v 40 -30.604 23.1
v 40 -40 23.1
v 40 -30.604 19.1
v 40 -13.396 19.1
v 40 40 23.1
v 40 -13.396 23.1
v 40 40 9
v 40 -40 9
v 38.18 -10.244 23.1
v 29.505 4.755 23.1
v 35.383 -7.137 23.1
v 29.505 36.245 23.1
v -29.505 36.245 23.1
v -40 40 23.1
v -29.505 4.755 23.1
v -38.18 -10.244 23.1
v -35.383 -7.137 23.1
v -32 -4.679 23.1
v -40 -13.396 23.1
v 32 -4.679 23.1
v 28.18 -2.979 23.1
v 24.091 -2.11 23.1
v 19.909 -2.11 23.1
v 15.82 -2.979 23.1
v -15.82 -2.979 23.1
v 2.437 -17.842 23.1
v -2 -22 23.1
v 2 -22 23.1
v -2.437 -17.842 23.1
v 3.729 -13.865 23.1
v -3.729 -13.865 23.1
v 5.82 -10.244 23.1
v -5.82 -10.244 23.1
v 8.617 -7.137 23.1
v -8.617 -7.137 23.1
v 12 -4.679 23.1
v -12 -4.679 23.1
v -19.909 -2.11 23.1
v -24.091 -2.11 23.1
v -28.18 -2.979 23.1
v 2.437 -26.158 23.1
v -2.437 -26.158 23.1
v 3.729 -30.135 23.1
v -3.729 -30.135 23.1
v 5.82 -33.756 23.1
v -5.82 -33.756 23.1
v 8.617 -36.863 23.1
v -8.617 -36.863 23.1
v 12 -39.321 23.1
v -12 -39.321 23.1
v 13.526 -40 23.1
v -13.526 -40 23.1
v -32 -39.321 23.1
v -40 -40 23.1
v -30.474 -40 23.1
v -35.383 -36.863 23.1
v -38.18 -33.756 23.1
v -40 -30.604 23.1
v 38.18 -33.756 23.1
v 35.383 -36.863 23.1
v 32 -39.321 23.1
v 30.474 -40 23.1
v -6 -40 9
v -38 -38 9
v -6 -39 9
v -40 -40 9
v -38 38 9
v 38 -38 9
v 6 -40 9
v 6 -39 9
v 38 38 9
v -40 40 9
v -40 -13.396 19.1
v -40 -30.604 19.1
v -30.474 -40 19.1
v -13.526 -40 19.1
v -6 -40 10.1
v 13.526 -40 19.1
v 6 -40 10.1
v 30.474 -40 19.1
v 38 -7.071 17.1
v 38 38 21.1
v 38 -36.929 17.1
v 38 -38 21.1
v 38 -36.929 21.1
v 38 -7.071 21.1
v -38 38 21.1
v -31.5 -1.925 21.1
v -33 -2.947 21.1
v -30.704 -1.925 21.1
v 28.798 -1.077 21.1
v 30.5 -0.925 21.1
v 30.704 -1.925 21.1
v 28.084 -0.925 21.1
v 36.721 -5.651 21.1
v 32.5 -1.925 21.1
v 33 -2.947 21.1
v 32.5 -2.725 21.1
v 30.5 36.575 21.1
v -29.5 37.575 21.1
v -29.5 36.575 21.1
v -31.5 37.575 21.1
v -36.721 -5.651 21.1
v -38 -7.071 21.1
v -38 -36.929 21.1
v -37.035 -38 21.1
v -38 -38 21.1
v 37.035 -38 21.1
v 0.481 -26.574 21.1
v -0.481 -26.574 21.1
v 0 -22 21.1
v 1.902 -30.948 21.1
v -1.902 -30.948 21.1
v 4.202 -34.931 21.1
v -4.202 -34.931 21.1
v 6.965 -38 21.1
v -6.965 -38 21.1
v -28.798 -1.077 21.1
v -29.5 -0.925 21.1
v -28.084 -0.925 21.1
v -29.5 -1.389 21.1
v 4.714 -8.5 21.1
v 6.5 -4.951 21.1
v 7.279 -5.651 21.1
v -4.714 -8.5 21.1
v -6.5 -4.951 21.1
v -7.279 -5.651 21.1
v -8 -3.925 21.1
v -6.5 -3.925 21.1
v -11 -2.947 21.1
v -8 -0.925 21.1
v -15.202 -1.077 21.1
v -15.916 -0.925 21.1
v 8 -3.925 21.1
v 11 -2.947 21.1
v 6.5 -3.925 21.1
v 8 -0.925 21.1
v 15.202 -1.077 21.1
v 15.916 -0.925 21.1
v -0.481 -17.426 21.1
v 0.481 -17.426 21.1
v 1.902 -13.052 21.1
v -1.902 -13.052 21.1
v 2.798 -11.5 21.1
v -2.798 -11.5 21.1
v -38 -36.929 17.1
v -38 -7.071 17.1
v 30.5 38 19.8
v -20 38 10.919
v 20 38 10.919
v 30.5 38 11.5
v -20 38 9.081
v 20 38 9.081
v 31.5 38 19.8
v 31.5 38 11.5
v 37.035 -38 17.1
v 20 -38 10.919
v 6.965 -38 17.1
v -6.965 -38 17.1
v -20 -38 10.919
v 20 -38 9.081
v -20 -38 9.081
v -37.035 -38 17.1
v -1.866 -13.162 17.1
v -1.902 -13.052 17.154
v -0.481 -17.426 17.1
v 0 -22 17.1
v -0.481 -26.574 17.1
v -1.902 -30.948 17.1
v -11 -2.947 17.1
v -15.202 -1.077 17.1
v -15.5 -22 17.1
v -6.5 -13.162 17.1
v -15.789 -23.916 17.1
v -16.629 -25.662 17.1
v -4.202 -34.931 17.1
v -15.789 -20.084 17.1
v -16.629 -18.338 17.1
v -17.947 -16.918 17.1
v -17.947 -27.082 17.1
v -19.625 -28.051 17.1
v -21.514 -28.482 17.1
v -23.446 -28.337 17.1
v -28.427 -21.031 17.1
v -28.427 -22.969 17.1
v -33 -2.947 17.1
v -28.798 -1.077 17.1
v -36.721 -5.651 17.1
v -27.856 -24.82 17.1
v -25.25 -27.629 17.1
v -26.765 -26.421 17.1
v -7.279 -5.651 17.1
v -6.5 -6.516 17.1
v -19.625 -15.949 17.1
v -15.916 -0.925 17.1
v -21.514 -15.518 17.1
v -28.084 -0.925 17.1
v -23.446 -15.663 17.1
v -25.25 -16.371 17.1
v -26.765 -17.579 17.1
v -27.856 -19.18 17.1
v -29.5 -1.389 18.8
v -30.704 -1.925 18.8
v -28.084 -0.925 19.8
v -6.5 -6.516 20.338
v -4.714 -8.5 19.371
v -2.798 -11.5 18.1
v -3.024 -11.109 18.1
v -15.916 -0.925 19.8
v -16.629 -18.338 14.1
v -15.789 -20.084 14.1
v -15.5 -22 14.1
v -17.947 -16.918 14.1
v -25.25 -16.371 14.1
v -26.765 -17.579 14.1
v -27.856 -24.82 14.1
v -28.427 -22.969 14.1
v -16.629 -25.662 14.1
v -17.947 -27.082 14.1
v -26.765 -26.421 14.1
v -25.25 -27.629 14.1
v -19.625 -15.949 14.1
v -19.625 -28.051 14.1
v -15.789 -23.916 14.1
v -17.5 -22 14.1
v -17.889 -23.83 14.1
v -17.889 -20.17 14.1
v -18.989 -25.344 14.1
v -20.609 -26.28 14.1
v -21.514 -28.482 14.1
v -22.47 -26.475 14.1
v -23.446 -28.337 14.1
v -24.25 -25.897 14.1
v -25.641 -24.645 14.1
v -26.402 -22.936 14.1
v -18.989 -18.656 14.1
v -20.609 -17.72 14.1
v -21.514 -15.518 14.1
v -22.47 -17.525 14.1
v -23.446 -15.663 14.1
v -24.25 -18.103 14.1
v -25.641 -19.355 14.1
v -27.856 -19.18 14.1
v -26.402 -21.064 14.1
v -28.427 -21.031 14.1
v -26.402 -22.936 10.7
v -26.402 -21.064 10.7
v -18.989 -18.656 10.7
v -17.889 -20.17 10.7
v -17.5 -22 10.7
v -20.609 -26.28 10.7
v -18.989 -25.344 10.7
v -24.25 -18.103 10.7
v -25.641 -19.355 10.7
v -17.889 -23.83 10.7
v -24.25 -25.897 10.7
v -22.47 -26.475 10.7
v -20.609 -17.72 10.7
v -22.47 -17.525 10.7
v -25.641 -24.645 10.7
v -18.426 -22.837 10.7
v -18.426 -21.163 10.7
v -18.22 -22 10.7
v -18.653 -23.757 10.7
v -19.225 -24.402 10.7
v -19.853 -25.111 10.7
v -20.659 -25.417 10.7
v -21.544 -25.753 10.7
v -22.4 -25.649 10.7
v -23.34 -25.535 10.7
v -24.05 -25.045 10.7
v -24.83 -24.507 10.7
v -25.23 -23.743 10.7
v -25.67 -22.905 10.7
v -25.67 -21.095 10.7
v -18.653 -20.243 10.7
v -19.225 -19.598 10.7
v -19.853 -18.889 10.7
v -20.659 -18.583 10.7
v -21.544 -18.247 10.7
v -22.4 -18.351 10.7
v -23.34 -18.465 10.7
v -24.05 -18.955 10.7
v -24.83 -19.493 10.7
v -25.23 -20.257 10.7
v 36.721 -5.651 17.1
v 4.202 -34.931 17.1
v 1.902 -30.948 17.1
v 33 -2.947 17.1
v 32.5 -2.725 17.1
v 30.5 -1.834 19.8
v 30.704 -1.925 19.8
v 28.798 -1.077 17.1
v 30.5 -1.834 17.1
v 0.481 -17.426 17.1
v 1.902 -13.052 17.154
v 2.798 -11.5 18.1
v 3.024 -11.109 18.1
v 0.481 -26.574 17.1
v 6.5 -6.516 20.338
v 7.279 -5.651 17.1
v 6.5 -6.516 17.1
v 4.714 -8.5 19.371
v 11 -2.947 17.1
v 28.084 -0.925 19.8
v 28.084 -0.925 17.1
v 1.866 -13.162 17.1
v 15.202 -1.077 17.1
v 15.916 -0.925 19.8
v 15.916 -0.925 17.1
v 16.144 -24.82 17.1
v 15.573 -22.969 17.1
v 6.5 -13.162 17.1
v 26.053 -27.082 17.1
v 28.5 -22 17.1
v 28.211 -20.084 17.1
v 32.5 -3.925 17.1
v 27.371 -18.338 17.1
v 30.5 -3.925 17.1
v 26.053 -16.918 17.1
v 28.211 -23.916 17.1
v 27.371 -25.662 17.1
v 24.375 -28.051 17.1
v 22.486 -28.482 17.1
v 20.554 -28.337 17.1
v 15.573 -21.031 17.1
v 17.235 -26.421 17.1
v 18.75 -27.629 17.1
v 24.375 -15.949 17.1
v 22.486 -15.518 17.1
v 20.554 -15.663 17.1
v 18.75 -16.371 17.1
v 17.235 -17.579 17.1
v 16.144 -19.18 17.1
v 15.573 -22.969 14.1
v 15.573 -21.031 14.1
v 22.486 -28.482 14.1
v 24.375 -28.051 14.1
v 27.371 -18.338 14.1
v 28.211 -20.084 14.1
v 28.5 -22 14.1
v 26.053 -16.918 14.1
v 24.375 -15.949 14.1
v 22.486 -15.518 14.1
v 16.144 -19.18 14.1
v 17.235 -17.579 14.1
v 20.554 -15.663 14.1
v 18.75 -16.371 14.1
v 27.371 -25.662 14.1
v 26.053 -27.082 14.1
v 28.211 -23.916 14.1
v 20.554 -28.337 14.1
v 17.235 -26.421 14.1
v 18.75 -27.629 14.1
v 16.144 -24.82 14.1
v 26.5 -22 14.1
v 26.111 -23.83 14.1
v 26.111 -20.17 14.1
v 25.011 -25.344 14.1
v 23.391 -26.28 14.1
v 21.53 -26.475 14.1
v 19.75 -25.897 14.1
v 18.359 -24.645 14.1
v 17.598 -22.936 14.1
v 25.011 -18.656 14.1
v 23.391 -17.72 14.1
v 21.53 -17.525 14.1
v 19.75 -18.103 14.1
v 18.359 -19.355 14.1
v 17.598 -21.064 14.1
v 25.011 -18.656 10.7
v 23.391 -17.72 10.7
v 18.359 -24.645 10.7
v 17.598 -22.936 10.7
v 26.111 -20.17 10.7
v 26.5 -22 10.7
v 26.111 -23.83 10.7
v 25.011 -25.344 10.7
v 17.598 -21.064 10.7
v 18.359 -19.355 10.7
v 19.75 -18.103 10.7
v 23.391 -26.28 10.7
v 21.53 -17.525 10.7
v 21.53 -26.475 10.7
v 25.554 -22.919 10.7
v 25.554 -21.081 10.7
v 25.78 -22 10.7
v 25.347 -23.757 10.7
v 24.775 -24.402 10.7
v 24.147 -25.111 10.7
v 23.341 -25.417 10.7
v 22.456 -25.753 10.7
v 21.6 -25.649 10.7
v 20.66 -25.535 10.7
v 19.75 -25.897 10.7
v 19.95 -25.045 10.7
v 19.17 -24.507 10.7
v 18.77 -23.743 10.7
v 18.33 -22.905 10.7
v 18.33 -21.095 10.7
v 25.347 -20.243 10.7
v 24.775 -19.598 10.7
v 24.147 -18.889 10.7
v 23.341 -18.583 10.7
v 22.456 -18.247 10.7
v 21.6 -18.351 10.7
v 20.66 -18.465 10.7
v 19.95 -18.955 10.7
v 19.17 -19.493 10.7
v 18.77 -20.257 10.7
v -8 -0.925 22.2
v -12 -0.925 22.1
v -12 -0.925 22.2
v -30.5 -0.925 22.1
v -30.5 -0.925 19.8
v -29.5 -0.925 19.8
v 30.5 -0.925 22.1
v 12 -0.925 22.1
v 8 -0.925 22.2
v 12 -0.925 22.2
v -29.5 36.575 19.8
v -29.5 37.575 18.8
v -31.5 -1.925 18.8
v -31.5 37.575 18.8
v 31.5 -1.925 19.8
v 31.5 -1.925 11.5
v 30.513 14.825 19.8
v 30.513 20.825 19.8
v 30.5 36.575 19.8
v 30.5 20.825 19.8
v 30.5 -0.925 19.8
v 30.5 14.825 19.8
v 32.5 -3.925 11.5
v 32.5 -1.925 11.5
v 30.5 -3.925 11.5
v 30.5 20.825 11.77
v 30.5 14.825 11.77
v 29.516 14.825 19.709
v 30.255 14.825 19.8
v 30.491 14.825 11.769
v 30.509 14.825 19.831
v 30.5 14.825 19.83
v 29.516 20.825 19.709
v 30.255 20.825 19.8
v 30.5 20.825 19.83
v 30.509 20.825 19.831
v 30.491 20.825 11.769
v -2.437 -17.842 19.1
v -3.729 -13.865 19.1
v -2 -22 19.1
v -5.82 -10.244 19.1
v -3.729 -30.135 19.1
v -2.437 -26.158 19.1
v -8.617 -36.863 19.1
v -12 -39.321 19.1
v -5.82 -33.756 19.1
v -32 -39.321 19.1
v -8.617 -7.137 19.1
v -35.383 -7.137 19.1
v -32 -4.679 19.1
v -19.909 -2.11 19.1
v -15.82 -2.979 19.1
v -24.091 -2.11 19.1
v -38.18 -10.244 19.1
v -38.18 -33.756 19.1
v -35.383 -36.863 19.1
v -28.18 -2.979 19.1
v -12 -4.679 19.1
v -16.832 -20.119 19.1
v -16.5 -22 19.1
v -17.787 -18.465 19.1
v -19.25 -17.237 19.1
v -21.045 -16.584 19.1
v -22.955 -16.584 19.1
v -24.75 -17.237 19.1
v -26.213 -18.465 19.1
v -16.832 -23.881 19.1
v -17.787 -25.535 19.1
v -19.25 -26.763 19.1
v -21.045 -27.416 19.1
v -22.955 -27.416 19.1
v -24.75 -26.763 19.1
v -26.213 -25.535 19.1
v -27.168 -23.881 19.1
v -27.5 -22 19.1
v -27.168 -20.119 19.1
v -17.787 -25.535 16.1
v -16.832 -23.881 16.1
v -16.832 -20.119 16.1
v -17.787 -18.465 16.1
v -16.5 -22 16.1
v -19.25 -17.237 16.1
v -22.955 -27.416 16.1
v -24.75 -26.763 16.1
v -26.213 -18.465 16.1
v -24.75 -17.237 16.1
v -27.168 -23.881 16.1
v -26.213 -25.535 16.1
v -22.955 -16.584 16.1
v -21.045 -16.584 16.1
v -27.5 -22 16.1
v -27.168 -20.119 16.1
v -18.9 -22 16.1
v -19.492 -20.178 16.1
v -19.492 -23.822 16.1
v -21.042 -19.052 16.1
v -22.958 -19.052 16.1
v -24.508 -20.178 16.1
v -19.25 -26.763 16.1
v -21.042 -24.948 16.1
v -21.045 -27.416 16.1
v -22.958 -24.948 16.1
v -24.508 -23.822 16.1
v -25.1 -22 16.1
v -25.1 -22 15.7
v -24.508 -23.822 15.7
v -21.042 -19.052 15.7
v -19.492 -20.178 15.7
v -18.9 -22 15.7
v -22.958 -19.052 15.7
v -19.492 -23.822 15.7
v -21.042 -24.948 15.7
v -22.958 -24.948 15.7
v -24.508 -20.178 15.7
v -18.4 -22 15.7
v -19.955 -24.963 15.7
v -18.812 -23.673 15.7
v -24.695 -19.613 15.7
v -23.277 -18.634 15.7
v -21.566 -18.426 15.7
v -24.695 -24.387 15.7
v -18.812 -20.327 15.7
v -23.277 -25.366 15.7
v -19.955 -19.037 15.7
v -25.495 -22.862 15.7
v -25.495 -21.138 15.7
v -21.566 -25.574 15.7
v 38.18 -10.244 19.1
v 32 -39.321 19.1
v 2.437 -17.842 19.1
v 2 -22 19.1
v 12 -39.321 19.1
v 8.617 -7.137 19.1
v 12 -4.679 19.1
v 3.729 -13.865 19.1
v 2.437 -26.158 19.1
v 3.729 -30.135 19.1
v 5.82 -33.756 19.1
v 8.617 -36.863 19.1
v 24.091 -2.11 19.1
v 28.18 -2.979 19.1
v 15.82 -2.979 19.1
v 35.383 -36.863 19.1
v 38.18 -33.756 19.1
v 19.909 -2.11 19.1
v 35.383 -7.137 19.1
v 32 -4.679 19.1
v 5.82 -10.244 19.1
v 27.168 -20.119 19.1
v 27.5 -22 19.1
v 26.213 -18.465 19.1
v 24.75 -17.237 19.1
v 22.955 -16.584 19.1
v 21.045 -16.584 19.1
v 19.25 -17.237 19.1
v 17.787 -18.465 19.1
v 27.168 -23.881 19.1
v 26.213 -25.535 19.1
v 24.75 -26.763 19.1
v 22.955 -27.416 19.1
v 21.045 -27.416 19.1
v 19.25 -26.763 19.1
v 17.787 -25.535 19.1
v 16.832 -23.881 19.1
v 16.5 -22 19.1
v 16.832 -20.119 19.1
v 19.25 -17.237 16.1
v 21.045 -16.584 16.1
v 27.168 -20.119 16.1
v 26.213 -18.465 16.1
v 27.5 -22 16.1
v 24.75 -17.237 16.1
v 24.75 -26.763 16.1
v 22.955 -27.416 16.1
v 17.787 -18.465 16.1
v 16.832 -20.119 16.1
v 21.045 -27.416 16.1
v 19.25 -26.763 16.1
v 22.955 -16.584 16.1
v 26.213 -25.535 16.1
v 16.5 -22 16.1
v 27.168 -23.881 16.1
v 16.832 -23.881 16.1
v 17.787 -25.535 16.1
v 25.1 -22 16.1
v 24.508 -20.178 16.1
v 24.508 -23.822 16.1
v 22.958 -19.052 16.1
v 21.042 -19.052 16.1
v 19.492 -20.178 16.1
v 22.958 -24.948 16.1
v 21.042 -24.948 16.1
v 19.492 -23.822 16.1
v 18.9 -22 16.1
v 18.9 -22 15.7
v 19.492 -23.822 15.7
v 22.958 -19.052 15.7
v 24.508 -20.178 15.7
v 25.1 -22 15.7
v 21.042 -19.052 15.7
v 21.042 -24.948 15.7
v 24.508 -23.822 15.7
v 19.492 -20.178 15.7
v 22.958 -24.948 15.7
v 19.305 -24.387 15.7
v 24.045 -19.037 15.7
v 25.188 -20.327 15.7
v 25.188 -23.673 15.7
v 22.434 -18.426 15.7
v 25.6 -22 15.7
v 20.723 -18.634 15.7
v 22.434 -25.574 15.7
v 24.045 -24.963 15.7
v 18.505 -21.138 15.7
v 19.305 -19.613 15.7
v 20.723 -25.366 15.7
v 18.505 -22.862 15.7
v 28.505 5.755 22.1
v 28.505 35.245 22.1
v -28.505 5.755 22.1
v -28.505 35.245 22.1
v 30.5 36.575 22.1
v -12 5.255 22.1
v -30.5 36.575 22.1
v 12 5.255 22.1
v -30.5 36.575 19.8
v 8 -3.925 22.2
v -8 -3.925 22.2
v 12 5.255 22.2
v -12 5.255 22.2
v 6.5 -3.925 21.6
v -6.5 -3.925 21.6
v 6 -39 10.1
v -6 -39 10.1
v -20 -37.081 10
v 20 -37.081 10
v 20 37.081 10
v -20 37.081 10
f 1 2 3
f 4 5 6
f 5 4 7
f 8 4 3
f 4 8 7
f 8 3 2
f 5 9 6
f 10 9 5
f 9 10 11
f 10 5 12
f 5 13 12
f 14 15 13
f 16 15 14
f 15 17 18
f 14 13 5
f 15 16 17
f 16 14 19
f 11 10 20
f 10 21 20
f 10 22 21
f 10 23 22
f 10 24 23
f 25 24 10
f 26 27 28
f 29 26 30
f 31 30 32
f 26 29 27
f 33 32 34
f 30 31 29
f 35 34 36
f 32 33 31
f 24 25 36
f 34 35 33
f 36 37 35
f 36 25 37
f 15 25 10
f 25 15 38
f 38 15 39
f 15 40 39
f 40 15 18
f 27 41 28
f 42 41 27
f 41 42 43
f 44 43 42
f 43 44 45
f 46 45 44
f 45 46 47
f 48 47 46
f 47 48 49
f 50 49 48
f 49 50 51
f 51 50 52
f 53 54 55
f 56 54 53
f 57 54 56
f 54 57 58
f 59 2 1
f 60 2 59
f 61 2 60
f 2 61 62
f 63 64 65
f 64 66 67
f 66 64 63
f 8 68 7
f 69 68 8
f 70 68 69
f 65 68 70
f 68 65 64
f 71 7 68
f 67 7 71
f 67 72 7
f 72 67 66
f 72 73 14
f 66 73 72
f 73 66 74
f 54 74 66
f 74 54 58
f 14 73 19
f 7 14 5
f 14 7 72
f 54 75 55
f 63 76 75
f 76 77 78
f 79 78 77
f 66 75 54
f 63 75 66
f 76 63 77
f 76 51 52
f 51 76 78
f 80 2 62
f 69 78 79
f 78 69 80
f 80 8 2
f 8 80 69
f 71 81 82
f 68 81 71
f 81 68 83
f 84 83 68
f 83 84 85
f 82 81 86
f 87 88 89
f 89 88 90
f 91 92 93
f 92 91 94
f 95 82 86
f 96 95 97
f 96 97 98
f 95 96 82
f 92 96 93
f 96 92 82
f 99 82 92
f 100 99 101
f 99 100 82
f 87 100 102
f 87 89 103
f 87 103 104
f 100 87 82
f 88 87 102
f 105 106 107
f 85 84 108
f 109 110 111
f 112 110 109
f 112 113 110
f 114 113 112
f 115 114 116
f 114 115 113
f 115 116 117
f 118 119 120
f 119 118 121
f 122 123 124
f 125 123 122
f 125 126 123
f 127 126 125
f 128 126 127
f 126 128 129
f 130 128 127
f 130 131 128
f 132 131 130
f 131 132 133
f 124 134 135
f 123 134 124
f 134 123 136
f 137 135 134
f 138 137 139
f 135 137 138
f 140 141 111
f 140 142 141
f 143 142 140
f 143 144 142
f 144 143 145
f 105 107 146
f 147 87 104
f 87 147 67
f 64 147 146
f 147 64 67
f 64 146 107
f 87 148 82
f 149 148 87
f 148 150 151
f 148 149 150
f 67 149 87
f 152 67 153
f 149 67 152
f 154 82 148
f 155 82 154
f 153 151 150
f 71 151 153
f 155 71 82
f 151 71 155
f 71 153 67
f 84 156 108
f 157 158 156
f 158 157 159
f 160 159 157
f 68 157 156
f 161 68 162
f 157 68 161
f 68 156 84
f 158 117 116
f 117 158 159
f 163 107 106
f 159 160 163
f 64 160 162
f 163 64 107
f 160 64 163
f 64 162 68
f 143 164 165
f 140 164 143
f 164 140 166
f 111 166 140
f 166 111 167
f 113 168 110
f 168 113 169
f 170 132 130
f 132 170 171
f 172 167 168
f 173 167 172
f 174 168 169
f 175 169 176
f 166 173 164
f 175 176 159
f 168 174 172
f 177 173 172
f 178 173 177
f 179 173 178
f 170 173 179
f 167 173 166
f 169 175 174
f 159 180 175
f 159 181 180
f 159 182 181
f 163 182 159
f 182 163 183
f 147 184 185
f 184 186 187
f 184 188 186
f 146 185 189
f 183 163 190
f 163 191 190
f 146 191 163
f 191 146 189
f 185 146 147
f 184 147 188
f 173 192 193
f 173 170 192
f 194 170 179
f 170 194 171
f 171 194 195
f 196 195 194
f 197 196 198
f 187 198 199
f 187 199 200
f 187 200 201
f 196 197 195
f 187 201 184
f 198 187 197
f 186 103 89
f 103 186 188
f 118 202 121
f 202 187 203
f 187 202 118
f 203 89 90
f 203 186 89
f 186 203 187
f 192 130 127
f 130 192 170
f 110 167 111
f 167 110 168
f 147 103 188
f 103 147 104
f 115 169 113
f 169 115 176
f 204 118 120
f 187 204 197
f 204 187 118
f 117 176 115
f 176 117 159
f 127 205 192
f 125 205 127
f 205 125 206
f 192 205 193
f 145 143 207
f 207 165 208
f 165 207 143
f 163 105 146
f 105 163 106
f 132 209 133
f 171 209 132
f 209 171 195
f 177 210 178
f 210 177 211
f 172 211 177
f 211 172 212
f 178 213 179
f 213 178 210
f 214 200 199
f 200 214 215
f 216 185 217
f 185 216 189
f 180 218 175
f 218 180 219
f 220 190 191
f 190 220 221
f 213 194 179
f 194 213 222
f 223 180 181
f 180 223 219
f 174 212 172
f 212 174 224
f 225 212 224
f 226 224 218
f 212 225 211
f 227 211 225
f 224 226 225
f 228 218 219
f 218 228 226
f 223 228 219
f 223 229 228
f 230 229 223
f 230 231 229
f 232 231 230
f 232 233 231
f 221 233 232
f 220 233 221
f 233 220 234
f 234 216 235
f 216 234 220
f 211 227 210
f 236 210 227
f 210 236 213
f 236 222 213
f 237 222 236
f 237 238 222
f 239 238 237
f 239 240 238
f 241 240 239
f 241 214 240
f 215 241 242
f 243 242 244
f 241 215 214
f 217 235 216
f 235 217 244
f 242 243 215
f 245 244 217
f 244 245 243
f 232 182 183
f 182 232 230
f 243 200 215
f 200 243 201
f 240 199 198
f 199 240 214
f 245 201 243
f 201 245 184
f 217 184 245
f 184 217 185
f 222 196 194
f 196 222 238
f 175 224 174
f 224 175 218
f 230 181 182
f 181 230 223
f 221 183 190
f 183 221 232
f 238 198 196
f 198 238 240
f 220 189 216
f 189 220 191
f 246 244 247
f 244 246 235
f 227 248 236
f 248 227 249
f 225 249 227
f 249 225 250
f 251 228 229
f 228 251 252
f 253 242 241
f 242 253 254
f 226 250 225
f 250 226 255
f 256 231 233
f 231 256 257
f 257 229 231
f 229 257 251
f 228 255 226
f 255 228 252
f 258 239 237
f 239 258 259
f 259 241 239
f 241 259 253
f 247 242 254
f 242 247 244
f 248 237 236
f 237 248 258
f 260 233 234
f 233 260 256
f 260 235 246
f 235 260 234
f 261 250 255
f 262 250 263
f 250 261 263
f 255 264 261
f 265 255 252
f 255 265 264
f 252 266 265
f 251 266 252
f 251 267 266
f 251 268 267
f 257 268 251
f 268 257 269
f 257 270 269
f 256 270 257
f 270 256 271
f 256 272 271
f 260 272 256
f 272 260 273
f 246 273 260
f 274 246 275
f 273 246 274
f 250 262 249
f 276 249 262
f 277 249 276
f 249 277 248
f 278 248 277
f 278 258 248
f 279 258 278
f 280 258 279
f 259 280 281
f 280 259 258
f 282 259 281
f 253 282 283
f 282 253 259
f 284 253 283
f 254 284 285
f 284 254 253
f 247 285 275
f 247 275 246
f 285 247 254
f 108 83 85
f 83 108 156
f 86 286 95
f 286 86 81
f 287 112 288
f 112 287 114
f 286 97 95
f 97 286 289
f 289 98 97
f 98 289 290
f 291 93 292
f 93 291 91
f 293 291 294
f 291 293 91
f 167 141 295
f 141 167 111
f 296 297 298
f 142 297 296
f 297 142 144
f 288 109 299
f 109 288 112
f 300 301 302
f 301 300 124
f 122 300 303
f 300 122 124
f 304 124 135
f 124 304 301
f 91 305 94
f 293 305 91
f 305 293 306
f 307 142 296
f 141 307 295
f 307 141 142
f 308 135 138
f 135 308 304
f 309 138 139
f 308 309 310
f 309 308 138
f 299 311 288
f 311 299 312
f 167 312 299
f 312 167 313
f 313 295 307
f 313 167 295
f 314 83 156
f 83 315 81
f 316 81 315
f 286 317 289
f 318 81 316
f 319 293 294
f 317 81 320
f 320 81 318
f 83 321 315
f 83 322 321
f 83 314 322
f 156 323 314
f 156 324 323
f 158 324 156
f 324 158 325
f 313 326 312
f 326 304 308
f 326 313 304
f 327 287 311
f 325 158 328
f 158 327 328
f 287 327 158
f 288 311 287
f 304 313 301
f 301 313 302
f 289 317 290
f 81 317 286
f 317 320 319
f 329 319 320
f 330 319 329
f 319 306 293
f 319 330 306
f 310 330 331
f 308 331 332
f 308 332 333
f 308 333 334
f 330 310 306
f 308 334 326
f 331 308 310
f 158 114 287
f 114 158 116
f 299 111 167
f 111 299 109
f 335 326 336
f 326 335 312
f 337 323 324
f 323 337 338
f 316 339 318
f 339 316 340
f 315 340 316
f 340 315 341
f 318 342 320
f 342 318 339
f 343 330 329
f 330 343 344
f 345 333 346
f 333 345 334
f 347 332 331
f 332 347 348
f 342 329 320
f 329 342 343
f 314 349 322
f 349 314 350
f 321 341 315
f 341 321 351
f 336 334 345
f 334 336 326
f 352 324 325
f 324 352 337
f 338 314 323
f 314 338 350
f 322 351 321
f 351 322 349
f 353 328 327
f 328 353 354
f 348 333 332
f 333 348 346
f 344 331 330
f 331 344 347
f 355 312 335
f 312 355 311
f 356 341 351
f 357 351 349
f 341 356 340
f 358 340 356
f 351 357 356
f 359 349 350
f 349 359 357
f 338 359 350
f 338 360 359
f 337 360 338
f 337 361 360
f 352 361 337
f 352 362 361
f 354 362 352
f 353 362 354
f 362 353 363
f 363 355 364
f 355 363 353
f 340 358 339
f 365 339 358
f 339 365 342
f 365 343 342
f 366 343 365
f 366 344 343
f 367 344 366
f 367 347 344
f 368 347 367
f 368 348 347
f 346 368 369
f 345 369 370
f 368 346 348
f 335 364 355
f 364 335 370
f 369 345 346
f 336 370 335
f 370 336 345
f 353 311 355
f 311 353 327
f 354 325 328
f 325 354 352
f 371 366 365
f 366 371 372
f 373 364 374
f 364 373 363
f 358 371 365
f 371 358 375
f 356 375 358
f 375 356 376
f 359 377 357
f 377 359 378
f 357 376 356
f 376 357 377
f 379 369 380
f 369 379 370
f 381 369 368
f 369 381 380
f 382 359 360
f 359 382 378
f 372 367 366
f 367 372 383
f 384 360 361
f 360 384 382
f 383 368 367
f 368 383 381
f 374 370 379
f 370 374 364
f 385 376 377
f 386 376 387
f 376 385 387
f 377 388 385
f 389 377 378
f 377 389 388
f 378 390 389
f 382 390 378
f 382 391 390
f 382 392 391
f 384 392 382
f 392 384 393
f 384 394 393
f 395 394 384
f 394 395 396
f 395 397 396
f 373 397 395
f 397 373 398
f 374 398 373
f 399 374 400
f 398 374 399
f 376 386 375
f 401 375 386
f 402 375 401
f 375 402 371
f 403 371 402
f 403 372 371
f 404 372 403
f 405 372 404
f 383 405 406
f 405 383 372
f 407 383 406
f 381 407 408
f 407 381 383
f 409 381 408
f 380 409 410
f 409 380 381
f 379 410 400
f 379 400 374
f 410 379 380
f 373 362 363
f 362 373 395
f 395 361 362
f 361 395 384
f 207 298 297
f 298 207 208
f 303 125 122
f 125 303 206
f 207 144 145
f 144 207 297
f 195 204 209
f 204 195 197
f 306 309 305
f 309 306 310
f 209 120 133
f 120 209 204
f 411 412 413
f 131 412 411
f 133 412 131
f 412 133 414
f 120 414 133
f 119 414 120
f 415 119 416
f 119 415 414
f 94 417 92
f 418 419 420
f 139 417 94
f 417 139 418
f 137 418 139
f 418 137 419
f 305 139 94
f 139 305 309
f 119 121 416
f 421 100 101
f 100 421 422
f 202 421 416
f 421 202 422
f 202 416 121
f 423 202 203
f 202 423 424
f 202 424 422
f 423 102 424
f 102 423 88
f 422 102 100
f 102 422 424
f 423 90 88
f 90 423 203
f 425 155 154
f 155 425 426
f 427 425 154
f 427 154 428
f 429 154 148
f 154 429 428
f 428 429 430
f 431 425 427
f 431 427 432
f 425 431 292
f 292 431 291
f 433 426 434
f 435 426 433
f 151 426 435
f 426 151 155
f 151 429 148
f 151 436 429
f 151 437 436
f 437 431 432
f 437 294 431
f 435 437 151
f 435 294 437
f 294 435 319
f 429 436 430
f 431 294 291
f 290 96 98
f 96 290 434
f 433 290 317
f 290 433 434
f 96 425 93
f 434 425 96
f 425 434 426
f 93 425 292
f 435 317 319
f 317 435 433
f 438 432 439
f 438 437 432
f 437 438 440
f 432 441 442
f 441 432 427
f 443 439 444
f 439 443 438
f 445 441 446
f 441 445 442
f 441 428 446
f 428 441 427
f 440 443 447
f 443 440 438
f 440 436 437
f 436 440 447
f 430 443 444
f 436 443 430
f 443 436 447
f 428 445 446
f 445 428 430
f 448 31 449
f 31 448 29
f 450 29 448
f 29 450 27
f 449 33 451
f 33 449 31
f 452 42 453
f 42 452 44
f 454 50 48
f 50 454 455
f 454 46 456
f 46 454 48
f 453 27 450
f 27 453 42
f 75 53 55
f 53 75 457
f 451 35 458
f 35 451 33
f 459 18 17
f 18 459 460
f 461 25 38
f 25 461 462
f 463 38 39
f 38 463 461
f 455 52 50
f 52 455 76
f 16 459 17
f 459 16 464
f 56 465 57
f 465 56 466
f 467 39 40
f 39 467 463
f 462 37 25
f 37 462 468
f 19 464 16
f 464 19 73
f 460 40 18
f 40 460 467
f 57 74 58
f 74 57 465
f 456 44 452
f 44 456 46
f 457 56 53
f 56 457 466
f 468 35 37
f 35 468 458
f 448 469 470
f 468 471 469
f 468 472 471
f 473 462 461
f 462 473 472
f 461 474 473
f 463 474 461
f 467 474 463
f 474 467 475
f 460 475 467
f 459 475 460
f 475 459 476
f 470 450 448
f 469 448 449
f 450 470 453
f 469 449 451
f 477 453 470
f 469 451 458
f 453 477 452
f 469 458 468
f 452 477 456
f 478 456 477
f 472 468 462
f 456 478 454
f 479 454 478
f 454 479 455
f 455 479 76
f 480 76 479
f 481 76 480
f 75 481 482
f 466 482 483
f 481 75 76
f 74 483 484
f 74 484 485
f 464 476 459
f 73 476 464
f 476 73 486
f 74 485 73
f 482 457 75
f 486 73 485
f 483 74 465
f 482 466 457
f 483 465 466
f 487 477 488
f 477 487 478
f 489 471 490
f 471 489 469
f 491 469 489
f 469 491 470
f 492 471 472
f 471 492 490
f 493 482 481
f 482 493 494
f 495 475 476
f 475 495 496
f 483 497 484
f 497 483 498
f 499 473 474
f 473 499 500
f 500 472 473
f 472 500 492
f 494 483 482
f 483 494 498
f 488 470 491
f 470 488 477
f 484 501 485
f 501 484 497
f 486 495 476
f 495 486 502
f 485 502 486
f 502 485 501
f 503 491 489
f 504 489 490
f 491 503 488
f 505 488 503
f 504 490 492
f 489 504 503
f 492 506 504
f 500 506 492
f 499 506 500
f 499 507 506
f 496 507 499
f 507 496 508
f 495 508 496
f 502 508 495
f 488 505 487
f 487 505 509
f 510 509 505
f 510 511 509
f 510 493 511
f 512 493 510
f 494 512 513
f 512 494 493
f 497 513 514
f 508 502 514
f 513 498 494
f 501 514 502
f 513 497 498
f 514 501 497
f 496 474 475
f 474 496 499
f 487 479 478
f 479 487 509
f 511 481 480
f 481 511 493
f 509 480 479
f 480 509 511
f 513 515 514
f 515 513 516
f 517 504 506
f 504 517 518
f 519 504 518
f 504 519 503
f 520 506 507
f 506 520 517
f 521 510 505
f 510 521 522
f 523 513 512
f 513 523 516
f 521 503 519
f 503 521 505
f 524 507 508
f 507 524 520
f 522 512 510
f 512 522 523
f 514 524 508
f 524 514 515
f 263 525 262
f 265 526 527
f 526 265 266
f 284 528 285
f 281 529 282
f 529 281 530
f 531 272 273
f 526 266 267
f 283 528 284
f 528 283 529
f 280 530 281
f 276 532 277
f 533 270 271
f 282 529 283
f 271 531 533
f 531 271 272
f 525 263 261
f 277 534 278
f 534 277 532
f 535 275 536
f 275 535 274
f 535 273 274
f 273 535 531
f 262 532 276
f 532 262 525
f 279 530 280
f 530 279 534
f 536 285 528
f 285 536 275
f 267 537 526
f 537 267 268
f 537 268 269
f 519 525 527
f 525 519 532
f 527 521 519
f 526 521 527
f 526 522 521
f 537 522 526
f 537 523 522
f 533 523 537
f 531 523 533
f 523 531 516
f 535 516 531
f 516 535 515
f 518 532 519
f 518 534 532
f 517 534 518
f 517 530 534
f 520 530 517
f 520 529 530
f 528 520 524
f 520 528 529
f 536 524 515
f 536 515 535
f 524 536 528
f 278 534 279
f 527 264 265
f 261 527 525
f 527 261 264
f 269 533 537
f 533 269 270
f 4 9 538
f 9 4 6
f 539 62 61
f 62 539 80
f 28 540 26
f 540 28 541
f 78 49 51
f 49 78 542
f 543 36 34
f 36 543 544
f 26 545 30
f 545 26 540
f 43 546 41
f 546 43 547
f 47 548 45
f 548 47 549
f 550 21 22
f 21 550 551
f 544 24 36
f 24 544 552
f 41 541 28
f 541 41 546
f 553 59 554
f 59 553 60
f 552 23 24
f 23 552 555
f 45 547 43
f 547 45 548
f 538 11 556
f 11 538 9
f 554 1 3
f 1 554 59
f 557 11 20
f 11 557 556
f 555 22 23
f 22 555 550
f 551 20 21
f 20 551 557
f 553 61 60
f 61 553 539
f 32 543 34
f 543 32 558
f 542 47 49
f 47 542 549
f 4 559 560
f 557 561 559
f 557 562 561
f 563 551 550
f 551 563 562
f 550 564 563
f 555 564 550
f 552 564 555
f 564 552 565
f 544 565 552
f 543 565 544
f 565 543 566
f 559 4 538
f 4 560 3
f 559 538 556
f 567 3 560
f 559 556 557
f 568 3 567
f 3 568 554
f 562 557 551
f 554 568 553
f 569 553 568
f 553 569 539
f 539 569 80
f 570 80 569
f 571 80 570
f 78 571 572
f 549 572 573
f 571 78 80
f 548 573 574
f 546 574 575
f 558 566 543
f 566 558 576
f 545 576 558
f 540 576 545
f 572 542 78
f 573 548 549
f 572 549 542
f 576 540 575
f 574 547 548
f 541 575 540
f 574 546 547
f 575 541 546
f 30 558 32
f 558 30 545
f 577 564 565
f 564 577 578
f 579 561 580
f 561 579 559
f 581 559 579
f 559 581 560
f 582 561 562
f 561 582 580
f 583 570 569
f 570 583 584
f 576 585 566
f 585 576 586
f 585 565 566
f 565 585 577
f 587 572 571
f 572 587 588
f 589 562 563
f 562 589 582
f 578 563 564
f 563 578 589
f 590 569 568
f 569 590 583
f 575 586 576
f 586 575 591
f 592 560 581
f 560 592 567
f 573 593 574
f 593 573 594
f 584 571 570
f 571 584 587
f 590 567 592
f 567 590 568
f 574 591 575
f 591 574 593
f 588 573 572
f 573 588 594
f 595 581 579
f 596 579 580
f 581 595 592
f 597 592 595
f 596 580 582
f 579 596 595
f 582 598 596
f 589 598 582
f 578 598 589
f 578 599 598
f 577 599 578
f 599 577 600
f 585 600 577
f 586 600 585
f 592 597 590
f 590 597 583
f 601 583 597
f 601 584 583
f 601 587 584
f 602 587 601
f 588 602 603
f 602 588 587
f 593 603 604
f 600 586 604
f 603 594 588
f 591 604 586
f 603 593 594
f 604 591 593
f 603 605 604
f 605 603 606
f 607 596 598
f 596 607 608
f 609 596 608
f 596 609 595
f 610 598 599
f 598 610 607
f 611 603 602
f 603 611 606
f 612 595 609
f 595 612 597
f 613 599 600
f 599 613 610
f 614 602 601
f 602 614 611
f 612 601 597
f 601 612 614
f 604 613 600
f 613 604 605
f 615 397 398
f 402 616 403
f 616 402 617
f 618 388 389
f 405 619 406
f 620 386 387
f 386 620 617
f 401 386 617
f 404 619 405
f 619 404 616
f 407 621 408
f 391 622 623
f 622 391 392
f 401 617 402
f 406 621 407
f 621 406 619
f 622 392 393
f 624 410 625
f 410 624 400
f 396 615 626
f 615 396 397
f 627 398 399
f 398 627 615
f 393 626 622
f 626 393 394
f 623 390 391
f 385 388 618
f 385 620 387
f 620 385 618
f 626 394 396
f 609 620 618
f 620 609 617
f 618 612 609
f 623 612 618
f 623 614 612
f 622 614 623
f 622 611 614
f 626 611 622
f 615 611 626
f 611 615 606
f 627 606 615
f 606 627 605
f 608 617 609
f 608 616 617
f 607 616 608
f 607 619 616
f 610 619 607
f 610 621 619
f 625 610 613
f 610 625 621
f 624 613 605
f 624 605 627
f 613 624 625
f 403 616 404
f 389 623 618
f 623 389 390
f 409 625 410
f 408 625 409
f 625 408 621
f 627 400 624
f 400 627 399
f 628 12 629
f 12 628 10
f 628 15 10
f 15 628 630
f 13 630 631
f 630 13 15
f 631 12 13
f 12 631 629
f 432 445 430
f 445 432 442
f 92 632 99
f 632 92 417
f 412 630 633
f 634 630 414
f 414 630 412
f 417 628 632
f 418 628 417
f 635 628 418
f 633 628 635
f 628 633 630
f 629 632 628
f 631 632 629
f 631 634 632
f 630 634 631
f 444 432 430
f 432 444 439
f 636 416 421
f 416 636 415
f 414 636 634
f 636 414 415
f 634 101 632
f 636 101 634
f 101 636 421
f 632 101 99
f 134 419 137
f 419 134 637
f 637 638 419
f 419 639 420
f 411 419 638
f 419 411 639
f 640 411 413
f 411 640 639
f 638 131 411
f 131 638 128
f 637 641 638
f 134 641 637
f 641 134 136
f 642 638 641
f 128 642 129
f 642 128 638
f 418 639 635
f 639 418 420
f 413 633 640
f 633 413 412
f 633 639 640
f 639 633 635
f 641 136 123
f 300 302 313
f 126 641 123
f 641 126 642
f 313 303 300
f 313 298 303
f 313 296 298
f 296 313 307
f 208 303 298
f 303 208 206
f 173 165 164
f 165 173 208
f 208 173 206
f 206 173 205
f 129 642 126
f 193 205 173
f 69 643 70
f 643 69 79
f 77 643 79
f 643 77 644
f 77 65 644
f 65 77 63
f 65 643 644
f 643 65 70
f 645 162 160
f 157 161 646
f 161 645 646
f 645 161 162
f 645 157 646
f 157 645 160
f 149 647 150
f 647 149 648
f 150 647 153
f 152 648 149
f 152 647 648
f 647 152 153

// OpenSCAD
//$fn = 128;
// config variables

// casing
coverZ1 = 9;
coverFit = 0.4;
coverOverlap = 2.5;

// potis (Bourns PEC12R-4215F-S0024)
potiX = 22;
potiY = -22;
potiL = 17.5; // length starting at pcb top according to data sheet
potiB = 6.1; // height of body (with switch)
potiLB = 5; // length of shaft bearing according to data sheet
potiF = 5; // shaft cutout according to data sheet
wheelR = 19.5; // radius of wheel
wheelGap = 0.5; // visible gab between box and wheel

// wago connectors
//wagoThickness = 3;

// pcb
pcbWidth = 70;
pcbHeight = 36;
pcbZ1 = 3;
pcbZ2 = pcbZ1+1.6; // mounting surface of potis on pcb

// micro usb slot
usbX = 0;
usbWidth = 8;
usbZ1 = pcbZ2;
usbZ2 = usbZ1+3; // thickness of usb connector
usbPlugWidth = 12;
usbPlugThickness = 8; // thickness of usb plug of usb cable

// micro sd slot
sdX = 0;
sdWidth = 11.5;
sdZ2 = pcbZ1;
sdZ1 = sdZ2-1.2;

// display panel
panelWidth = 60.5+0.5;
panelHeight = 37+0.5;
panelThickness = 2.3;
cableWidth = 13;
cableWidth2 = 16;

// screen (active area of display)
screenX = 0;
screenY = 20.5;
screenWidth = 57.01;
screenHeight = 29.49;
screenOffset = 1.08+0.25; // distance between upper panel border and upper screen border

// dependent variables

// pcb
pcbX = 0; // x center of pcb
pcbX1 = pcbX-pcbWidth/2;
pcbX2 = pcbX+pcbWidth/2;
pcbY1 = -pcbHeight;
pcbY2 = 0;
pcbY = (pcbY1+pcbY2)/2; // y center of pcb

// depth of base and cover
baseZ2 = coverZ1+coverOverlap;
coverZ2 = pcbZ2+potiL+1;

// display panel
panelX1 = screenX-panelWidth/2; // left border of panel
panelX2 = screenX+panelWidth/2; // right border of panel
panelY2 = screenY+screenHeight/2+screenOffset; // upper border of panel
panelY1 = panelY2-panelHeight; // lower border of panel
panelY = (panelY2+panelY1)/2;
panelZ1 = coverZ2-1-panelThickness;
panelZ2 = coverZ2-1;

// screen
screenX1 = screenX-screenWidth/2;
screenX2 = screenX+screenWidth/2;
screenY1 = screenY-screenHeight/2;
screenY2 = screenY+screenHeight/2;


// cuboid with center at (x, y, z+d/2)
module box(x, y, z, w, z1, z2) {
	translate([x-w/2, y-h/2, z1])
		cube([w, h, z2-z1]);
}

module cuboid(x1, y1, z1, x2, y2, z2) {
	translate([x1, y1, z1])
		cube([x2-x1, y2-y1, z2-z1]);
}

module barrel(x, y, r, z1, z2) {
	translate([x, y, z1])
		cylinder(r=r, h=z2-z1);
}

module longHoleX(x, y, r, l, z1, z2) {
	barrel(x=x-l/2, y=y, r=r, z1=z1, z2=z2);
	barrel(x=x+l/2, y=y, r=r, z1=z1, z2=z2);
	box(x=x, y=y, w=l, h=r*2, z1=z1, z2=z2);
}

module longHoleY(x, y, r, l, z1, z2) {
	barrel(x=x, y=y-l/2, r=r, z1=z1, z2=z2);
	barrel(x=x, y=y+l/2, r=r, z1=z1, z2=z2);
	box(x=x, y=y, w=r*2, h=l, z1=z1, z2=z2);
}

module frustum(x, y, w1, h1, w2, h2, z1, z2) {
	// https://en.wikibooks.org/wiki/OpenSCAD_User_Manual/Primitive_Solids#polyhedron	
	points = [
		// lower square
		[x-w1/2,  y-h1/2, z1],  // 0
		[x+w1/2,  y-h1/2, z1],  // 1
		[x+w1/2,  y+h1/2, z1],  // 2
		[x-w1/2,  y+h1/2, z1],  // 3
		// upper square
		[x-w2/2,  y-h2/2, z2],  // 4
		[x+w2/2,  y-h2/2, z2],  // 5
		[x+w2/2,  y+h2/2, z2],  // 6
		[x-w2/2,  y+h2/2, z2]]; // 7
	faces = [
		[0,1,2,3],  // bottom
		[4,5,1,0],  // front
		[7,6,5,4],  // top
		[5,6,2,1],  // right
		[6,7,3,2],  // back
		[7,4,0,3]]; // left  
	polyhedron(points, faces);
}

module wheel(select) {
	x = potiX * select;
	y = potiY;

	// wheel
	difference() {
		// wheel with 3mm thickness
		barrel(x=x, y=y, r=wheelR, z1=coverZ2-3, z2=coverZ2);

		// cutout for shaft down to 1mm thickness
		box(x=x, y=y, w=10, h=4.5, z1=1, z2=coverZ2-1);
		box(x=x, y=y, w=4.5, h=10, z1=1, z2=coverZ2-1);
	}
	
	// shaft holder for 6mm shaft
	difference() {
		intersection() {
			// box that has 1mm air gap on sides
			box(x=x, y=y, w=8, h=8, z1=coverZ2-1-potiF, z2=coverZ2-2);

			// make round corners
			barrel(x=x, y=y, r=5, z1=1, z2=coverZ2-1);
		}

		// subtract rounded hole
		intersection() {
			box(x=x, y=y, w=5.8, h=5.8, z1=1, z2=coverZ2-1);
			barrel(x=x, y=y, r=3.5, z1=1, z2=coverZ2-1);
		}
	}
	
	// shaft cutaway
	difference() {
		// fill shaft cutaway which is 1.5mm
		union() {
			box(x=x, y=y+2.4, w=1, h=2, z1=coverZ2-1-potiF, z2=coverZ2-2);
			box(x=x, y=y+1.9, w=2, h=1, z1=coverZ2-1-potiF, z2=coverZ2-2);
		}

		// subtract slanted corners to ease insertion of poti shaft
		translate([x, y+1.5, coverZ2-1-potiF-0.5])
			rotate([30, 0, 0])
				box(x=0, y=0, w=4, h=1, z1=0, z2=2);
	}
}

module wheelBase(x, y) {
	// base in z-direction: 3mm wheel, 1mm air, 2mm base
	barrel(x=x, y=y, r=wheelR+wheelGap+2, z1=coverZ2-3-1-2, z2=coverZ2);

	h1 = pcbZ2+potiB;
	h3 = coverZ2-1-potiF-3;
	
	// shaft radial: 5mm wheel shaft, air gap, 1mm wall
	barrel(x=x, y=y, r=5+wheelGap+1, z1=h3, z2=coverZ2);

	// shaft radial: 3.5mm poti shaft, no air gap, 1mm wall
	barrel(x=x, y=y, r=3.5+1, z1=h1, z2=coverZ2);

	// pcb holders
	//box(x=x, y=y+12.4/2+1, w=13.4, h=2, z1=pcbZ2, z2=coverZ2);
	//box(x=x, y=y-12.4/2-1, w=13.4, h=2, z1=pcbZ2, z2=coverZ2);
}

module potiCutout(x, y) {
	// cutout for wheel: 3mm wheel, 1mm air
	barrel(x=x, y=y, r=wheelR+wheelGap, z1=coverZ2-3-1, z2=coverZ2+1);

	h1 = pcbZ2;
	h2 = pcbZ2+potiB+potiLB;
	h3 = coverZ2-1-potiF-1;

	// hole for wheel shaft: 5mm wheel shaft, air gap
	barrel(x=x, y=y, r=5+wheelGap, z1=h3, z2=coverZ2);
	
	// hole for poti shaft: 3mm poti shaft (6mm diameter), tolerance
	barrel(x=x, y=y, r=3+0.1, z1=h1, z2=coverZ2);
	
	// hole for poti shaft bearing: 3.5mm poti shaft bearing, tolerance
	translate([x, y, h1])
		cylinder(r1=4, r2=3.5+0.1, h=h2-h1);
}

module snap(y, l) {
	translate([0, y, coverZ1+1])
		rotate([45, 0, 0])
			cuboid(x1=-l/2, x2=l/2, y1=-0.65, y2=0.65, z1=-0.65, z2=0.65);
}

module usb() {
	color([0.5, 0.5, 0.5])
	box(x=usbX, y=pcbY1+1, w=usbWidth, h=10, z1=usbZ1, z2=usbZ2);		
}

module usbPlug() {
	usbPlugZ1 = (usbZ1+usbZ2)/2-usbPlugThickness/2;
	color([0, 0, 0])
	box(x=usbX, y=pcbY1-10, w=usbPlugWidth, h=14,
		z1=usbPlugZ1, z2=usbPlugZ1+usbPlugThickness);		
}

module sd() {
	color([0.5, 0.5, 0.5])
	box(x=sdX, y=pcbY1+4.5, w=sdWidth, h=15, z1=sdZ1, z2=sdZ2);		
}

module base() {
color([0.3, 0.3, 1]) {
	difference() {
		union() {
			difference() {
				// base with slanted walls
				union() {
					box(x=0, y=0, w=76-coverFit, h=76-coverFit,
						z1=0, z2=baseZ2-0.5);
					frustum(x=0, y=0,
						w1=76-coverFit, h1=76-coverFit,
						w2=76-coverFit-0.2, h2=76-coverFit-0.2,
						z1=baseZ2-0.5, z2=baseZ2);
				}
				
				// subtract inner volume
				box(x=0, y=0, w=72-coverFit, h=72-coverFit, z1=2, z2=baseZ2+1);
			
				// subtract snap lock
				snap(-76/2, 44);
				snap(76/2, 44);			
			}
			
			// add reinforcement for screw holes
			//box(x=0, y=12, w=74, h=3, z1=0, z2=4);
		}
		
		// subtract cable hole
		//longHoleX(x=0, y=6, r=4, l=8, z1=-1, z2=6);
		barrel(x=0, y=0, r=8, z1=-1, z2=6);
		
		// subtract mounting screw holes
		longHoleY(x=-12.5, y=0, r=1.5, l=1, z1=-1, z2=6);
		longHoleY(x=12.5, y=0, r=1.5, l=1, z1=-1, z2=6);
		longHoleY(x=-30, y=0, r=1.5, l=1.5, z1=-1, z2=6);
		longHoleY(x=30, y=0, r=1.5, l=1.5, z1=-1, z2=6);
		
		// subtract connector cutouts
		box(x=pcbX1+10, y=pcbY2-7.5, w=20, h=15, z1=0.8, z2=3);
		box(x=pcbX2-10, y=pcbY2-7.5, w=20, h=15, z1=0.8, z2=3);
		
		// subtract micro usb and sd slots
		usb();
		sd();
		
		// subtract pcb
		box(x=pcbX, y=pcbY, w=pcbWidth+1.5, h=pcbHeight+1,
		z1=pcbZ1-0.1, z2=pcbZ2+0.1);
	}

	// poti supports
	box(x=-potiX+6, y=potiY, w=2, h=2, z1=0, z2=pcbZ1);
	box(x=potiX-6, y=potiY, w=2, h=2, z1=0, z2=pcbZ1);
	box(x=-potiX-10, y=potiY, w=2, h=2, z1=0, z2=pcbZ1);
	box(x=potiX+10, y=potiY, w=2, h=2, z1=0, z2=pcbZ1);
} // color
}

module cover() {
color([1, 0, 0]) {
	difference() {
		union() {
			// case with 2mm wall thickness
			difference() {
				box(x=0, y=0, w=80, h=80, z1=coverZ1, z2=coverZ2);
				box(x=0, y=0, w=76, h=76, z1=coverZ1-1, z2=coverZ2-2);
			}
			
			intersection() {
				// poti bases
				union() {
					wheelBase(x=-potiX, y=potiY);
					wheelBase(x=potiX, y=potiY);
					box(x=0, y=-10, w=cableWidth, h=3, z1=coverZ2-5, z2=coverZ2);
				}
			
				// cut away poti bases outside of box and at display
				cuboid(x1=-40, y1=-40, z1=pcbZ2, x2=40, y2=panelY1, z2=coverZ2);
			}
			
			// left display holder
			box(x=panelX1, y=panelY, w=2, h=panelHeight+2,
				z1=panelZ1-1, z2=coverZ2);

			// right display holder with snap
			box(x=panelX2+0.5, y=panelY, w=1, h=panelHeight+4, 
				z1=baseZ2, z2=panelZ1); 
			box(x=panelX2+1, y=panelY1-2, w=2, h=2, 
				z1=baseZ2, z2=coverZ2); 
			translate([panelX2, panelY, panelZ1-4])
				rotate([0, -7, 0])
					box(x=0, y=0, w=1, h=6, z1=-4, z2=4); 
			
			// pcb holders
			//box(x=pcbX1+9, y=pcbY2-3, w=18, h=2, z1=pcbZ2, z2=coverZ2);
			//box(x=pcbX2-9, y=pcbY2-3, w=18, h=2, z1=pcbZ2, z2=coverZ2);
		}
		
		// subtract poti cutouts for wheel and axis
		potiCutout(x=-potiX, y=potiY);
		potiCutout(x=potiX, y=potiY);		

		// subtract display screen (activa area) window
		frustum(x=screenX, y=screenY,
				w1=screenWidth-4, h1=screenHeight-4,
				w2=screenWidth+4, h2=screenHeight+4,
				z1=coverZ2-3, z2=coverZ2+1);

		// subtract display panel (glass carrier) cutout
		cuboid(x1=panelX1, y1=panelY1, z1=panelZ1,
				x2=panelX2, y2=panelY2, z2=coverZ2-1);

		// subtract display cable cutout
		box(x=screenX, y=panelY1, w=cableWidth2, h=6,
			z1=panelZ2-10, z2=panelZ2+0.1);
		cuboid(x1=screenX-12, x2=screenX+12, y1=panelY1, y2=screenY1-0.5,
			z1=coverZ2-10, z2=panelZ2+0.1);
		frustum(x=screenX, y=panelY1, 
				w1=cableWidth, h1=45,
				w2=cableWidth, h2=6,
				z1=panelZ2-10, z2=panelZ2-0.5);
	
		// subtract usb plug
		usbPlug();
	}

	// snap lock between upper and lower case
	snap(-(76)/2, 40);
	snap((76)/2, 40);

	// cable holder
	//box(x=-30, y=30, w=16, h=2, z1=baseZ2, z2=baseZ2+4);
	//box(x=-23, y=34, w=2, h=10, z1=baseZ2, z2=baseZ2+4);
} // color
}

module pcb() {
	color([0, 0.6, 0, 0.3])
	box(x=pcbX, y=pcbY, w=pcbWidth, h=pcbHeight,
		z1=pcbZ1, z2=pcbZ2);
}

module poti(select) {
	x = potiX * select;
	y = potiY;
	color([0.5, 0.5, 0.5]) {
		box(x=x, y=y, w=13.4, h=12.4, z1=pcbZ2, z2=pcbZ2+potiB);
		box(x=x, y=y, w=15, h=6, z1=pcbZ2, z2=pcbZ2+4);
		barrel(x=x, y=y, r=3.5, z1=pcbZ2, z2=pcbZ2+potiB+potiLB);
		barrel(x=x, y=y, r=3, z1=pcbZ2, z2=pcbZ2+potiL);
	}
}

// casing parts that need to be printed
//base();
cover();
//wheel(-1);
//wheel(1);


// reference parts
//pcb();
//poti(-1);
//poti(1);
//usb(); usbPlug();
//sd();
